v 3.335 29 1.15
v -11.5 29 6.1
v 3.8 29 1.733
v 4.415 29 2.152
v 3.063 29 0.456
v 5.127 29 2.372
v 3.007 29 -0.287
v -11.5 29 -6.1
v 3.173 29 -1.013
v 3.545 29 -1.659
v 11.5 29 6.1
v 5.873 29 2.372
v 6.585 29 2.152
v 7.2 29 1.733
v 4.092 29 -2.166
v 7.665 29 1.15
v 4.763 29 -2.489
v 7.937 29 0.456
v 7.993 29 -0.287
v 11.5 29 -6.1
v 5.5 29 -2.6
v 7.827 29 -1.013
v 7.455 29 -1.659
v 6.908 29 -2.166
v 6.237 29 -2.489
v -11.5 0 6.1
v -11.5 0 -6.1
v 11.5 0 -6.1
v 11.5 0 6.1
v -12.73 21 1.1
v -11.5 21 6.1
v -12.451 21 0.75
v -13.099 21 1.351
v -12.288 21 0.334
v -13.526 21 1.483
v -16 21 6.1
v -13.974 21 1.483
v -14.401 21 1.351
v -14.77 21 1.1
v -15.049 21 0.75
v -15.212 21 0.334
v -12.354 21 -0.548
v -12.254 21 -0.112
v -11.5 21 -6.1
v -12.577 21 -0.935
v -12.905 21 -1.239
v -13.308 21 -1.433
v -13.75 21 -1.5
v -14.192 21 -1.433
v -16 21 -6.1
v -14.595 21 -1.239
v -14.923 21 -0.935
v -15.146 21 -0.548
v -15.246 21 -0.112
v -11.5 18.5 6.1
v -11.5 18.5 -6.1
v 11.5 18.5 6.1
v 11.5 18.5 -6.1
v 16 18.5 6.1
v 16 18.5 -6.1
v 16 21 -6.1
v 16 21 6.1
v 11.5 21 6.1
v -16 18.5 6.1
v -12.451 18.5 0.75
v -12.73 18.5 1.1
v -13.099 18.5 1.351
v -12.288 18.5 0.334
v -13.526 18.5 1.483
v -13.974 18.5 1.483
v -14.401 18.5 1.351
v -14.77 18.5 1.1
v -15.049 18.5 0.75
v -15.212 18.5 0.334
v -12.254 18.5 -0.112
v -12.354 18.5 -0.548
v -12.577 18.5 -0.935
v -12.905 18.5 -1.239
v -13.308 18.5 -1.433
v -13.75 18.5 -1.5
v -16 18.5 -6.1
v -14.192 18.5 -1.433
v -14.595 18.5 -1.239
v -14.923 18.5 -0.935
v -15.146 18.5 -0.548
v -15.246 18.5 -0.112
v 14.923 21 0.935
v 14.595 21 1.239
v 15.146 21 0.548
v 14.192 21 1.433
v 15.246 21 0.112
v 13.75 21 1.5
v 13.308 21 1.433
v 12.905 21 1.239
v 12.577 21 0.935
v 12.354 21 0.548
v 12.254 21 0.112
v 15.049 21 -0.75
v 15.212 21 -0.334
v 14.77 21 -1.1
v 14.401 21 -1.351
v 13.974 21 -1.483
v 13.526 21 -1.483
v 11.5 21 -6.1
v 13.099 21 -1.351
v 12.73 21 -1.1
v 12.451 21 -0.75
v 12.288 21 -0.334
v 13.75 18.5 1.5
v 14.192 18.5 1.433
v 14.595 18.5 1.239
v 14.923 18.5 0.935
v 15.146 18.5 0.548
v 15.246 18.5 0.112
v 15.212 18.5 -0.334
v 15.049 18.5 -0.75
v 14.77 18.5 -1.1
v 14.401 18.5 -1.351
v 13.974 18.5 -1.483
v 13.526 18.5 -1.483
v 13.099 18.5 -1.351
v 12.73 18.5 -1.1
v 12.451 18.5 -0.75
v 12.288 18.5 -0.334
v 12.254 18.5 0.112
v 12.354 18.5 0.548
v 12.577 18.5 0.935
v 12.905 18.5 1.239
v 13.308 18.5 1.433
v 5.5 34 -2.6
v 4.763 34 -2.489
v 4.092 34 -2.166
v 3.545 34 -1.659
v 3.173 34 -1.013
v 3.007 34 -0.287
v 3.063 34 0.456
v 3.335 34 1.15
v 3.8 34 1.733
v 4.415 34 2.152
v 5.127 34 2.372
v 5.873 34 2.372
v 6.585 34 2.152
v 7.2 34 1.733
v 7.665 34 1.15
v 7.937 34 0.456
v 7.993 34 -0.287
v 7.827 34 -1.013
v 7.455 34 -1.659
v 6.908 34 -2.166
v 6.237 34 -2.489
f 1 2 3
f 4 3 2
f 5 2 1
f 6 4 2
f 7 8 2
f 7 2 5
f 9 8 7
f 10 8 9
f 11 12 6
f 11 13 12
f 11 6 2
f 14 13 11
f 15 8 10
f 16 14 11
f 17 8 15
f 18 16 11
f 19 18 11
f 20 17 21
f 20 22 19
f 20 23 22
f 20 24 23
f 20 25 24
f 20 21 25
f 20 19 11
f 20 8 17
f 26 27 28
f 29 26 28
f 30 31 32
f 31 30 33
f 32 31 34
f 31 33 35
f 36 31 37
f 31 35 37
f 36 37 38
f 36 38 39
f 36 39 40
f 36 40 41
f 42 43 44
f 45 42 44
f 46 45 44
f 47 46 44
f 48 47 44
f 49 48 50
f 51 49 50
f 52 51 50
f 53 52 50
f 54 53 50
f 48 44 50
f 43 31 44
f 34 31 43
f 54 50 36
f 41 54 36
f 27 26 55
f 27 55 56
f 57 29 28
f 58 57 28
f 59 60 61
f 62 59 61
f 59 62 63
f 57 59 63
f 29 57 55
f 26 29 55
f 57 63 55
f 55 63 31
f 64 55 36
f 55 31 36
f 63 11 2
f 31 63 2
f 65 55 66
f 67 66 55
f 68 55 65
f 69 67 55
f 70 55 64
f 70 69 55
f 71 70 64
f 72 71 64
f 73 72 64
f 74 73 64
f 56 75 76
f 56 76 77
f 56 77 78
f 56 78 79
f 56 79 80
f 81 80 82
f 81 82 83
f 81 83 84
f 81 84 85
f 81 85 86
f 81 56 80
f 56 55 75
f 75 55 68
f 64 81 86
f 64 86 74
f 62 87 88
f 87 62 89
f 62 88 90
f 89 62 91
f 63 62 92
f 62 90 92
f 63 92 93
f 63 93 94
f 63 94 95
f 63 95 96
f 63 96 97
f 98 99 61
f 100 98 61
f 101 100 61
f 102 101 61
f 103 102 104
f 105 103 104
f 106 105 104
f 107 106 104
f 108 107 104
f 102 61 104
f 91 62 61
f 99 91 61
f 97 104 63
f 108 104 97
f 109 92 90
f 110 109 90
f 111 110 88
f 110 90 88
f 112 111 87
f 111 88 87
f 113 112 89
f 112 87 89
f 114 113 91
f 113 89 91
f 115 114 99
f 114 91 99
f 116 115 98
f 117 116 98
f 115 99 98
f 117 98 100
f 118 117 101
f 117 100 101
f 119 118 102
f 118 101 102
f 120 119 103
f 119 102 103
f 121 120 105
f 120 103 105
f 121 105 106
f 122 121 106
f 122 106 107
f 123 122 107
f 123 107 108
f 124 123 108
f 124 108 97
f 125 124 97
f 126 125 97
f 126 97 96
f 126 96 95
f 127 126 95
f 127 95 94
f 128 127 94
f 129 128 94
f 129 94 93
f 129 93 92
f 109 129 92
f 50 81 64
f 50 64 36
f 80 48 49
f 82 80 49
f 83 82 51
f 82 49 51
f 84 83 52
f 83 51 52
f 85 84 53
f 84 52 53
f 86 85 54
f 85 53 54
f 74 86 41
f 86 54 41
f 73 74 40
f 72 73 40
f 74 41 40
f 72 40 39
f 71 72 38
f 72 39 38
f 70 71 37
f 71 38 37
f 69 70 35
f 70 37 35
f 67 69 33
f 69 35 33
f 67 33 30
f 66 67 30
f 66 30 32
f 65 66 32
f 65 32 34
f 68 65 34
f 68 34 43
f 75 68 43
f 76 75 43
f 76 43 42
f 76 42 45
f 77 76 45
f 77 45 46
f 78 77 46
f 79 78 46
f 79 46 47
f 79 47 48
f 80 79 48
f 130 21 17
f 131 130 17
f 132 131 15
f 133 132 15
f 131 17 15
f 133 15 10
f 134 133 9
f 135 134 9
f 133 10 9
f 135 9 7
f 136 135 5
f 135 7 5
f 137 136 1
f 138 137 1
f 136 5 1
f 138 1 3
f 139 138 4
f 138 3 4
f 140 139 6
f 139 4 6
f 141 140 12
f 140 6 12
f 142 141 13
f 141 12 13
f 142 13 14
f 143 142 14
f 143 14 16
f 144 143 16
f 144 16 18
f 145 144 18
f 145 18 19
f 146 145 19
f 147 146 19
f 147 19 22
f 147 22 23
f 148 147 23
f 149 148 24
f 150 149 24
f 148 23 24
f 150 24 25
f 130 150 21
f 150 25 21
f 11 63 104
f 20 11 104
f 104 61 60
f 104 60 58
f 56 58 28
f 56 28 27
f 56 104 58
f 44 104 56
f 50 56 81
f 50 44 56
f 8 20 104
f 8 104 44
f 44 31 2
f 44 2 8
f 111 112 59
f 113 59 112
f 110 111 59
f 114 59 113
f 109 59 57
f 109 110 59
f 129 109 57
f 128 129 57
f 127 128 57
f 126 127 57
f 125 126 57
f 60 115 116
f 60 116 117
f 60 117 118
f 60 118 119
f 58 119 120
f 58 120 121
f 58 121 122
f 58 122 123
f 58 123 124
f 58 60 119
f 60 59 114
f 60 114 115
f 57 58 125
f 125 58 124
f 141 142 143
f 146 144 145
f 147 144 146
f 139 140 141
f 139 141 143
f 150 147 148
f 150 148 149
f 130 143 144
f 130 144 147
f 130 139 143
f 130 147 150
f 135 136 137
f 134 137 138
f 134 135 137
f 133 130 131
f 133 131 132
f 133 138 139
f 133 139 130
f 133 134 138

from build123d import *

# Parameters (mm, degrees)
SKETCH_1_W          = 23
SKETCH_1_H          = 12.2
EXTRUDE_1_DEPTH     = 29
SKETCH_2_W          = 32
SKETCH_2_H          = 2.5
EXTRUDE_2_DEPTH     = 12.2
SKETCH_3_R          = 1.5
CUT_EXTRUDE_1_DEPTH = 6
SKETCH_4_R          = 2.5
EXTRUDE_3_DEPTH     = 5


with BuildPart() as part:
    # Эскиз1 → Бобышка-Вытянуть1 (new body)
    with BuildSketch(Plane(origin=(0, 0, 0), x_dir=(1, 0, 0), z_dir=(0, 1, 0))):
        Rectangle(SKETCH_1_W, SKETCH_1_H)
    extrude(amount=EXTRUDE_1_DEPTH)

    # Эскиз2 → Бобышка-Вытянуть2 (add)
    with BuildSketch(Plane(origin=(0, 0, -6.1), x_dir=(-1, 0, 0), z_dir=(0, 0, -1))):
        with Locations((0, 19.75)):
            Rectangle(SKETCH_2_W, SKETCH_2_H)
    extrude(amount=-EXTRUDE_2_DEPTH)

    # Эскиз3 → Вырез-Вытянуть1 (cut)
    with BuildSketch(Plane(origin=(0, 21, 0), x_dir=(1, 0, 0), z_dir=(0, 1, 0))):
        with Locations(Location((13.75, 0, 0), (0, 0, 270))):
            Circle(SKETCH_3_R)
        with Locations(Location((-13.75, 0, 0), (0, 0, 90))):
            Circle(SKETCH_3_R)
    extrude(amount=-CUT_EXTRUDE_1_DEPTH, mode=Mode.SUBTRACT)

    # Эскиз4 → Бобышка-Вытянуть3 (add)
    with BuildSketch(Plane(origin=(0, 29, 0), x_dir=(1, 0, 0), z_dir=(0, 1, 0))):
        with Locations(Location((5.5, 0.1, 0), (0, 0, 90))):
            Circle(SKETCH_4_R)
    extrude(amount=EXTRUDE_3_DEPTH)


solid = part.part
